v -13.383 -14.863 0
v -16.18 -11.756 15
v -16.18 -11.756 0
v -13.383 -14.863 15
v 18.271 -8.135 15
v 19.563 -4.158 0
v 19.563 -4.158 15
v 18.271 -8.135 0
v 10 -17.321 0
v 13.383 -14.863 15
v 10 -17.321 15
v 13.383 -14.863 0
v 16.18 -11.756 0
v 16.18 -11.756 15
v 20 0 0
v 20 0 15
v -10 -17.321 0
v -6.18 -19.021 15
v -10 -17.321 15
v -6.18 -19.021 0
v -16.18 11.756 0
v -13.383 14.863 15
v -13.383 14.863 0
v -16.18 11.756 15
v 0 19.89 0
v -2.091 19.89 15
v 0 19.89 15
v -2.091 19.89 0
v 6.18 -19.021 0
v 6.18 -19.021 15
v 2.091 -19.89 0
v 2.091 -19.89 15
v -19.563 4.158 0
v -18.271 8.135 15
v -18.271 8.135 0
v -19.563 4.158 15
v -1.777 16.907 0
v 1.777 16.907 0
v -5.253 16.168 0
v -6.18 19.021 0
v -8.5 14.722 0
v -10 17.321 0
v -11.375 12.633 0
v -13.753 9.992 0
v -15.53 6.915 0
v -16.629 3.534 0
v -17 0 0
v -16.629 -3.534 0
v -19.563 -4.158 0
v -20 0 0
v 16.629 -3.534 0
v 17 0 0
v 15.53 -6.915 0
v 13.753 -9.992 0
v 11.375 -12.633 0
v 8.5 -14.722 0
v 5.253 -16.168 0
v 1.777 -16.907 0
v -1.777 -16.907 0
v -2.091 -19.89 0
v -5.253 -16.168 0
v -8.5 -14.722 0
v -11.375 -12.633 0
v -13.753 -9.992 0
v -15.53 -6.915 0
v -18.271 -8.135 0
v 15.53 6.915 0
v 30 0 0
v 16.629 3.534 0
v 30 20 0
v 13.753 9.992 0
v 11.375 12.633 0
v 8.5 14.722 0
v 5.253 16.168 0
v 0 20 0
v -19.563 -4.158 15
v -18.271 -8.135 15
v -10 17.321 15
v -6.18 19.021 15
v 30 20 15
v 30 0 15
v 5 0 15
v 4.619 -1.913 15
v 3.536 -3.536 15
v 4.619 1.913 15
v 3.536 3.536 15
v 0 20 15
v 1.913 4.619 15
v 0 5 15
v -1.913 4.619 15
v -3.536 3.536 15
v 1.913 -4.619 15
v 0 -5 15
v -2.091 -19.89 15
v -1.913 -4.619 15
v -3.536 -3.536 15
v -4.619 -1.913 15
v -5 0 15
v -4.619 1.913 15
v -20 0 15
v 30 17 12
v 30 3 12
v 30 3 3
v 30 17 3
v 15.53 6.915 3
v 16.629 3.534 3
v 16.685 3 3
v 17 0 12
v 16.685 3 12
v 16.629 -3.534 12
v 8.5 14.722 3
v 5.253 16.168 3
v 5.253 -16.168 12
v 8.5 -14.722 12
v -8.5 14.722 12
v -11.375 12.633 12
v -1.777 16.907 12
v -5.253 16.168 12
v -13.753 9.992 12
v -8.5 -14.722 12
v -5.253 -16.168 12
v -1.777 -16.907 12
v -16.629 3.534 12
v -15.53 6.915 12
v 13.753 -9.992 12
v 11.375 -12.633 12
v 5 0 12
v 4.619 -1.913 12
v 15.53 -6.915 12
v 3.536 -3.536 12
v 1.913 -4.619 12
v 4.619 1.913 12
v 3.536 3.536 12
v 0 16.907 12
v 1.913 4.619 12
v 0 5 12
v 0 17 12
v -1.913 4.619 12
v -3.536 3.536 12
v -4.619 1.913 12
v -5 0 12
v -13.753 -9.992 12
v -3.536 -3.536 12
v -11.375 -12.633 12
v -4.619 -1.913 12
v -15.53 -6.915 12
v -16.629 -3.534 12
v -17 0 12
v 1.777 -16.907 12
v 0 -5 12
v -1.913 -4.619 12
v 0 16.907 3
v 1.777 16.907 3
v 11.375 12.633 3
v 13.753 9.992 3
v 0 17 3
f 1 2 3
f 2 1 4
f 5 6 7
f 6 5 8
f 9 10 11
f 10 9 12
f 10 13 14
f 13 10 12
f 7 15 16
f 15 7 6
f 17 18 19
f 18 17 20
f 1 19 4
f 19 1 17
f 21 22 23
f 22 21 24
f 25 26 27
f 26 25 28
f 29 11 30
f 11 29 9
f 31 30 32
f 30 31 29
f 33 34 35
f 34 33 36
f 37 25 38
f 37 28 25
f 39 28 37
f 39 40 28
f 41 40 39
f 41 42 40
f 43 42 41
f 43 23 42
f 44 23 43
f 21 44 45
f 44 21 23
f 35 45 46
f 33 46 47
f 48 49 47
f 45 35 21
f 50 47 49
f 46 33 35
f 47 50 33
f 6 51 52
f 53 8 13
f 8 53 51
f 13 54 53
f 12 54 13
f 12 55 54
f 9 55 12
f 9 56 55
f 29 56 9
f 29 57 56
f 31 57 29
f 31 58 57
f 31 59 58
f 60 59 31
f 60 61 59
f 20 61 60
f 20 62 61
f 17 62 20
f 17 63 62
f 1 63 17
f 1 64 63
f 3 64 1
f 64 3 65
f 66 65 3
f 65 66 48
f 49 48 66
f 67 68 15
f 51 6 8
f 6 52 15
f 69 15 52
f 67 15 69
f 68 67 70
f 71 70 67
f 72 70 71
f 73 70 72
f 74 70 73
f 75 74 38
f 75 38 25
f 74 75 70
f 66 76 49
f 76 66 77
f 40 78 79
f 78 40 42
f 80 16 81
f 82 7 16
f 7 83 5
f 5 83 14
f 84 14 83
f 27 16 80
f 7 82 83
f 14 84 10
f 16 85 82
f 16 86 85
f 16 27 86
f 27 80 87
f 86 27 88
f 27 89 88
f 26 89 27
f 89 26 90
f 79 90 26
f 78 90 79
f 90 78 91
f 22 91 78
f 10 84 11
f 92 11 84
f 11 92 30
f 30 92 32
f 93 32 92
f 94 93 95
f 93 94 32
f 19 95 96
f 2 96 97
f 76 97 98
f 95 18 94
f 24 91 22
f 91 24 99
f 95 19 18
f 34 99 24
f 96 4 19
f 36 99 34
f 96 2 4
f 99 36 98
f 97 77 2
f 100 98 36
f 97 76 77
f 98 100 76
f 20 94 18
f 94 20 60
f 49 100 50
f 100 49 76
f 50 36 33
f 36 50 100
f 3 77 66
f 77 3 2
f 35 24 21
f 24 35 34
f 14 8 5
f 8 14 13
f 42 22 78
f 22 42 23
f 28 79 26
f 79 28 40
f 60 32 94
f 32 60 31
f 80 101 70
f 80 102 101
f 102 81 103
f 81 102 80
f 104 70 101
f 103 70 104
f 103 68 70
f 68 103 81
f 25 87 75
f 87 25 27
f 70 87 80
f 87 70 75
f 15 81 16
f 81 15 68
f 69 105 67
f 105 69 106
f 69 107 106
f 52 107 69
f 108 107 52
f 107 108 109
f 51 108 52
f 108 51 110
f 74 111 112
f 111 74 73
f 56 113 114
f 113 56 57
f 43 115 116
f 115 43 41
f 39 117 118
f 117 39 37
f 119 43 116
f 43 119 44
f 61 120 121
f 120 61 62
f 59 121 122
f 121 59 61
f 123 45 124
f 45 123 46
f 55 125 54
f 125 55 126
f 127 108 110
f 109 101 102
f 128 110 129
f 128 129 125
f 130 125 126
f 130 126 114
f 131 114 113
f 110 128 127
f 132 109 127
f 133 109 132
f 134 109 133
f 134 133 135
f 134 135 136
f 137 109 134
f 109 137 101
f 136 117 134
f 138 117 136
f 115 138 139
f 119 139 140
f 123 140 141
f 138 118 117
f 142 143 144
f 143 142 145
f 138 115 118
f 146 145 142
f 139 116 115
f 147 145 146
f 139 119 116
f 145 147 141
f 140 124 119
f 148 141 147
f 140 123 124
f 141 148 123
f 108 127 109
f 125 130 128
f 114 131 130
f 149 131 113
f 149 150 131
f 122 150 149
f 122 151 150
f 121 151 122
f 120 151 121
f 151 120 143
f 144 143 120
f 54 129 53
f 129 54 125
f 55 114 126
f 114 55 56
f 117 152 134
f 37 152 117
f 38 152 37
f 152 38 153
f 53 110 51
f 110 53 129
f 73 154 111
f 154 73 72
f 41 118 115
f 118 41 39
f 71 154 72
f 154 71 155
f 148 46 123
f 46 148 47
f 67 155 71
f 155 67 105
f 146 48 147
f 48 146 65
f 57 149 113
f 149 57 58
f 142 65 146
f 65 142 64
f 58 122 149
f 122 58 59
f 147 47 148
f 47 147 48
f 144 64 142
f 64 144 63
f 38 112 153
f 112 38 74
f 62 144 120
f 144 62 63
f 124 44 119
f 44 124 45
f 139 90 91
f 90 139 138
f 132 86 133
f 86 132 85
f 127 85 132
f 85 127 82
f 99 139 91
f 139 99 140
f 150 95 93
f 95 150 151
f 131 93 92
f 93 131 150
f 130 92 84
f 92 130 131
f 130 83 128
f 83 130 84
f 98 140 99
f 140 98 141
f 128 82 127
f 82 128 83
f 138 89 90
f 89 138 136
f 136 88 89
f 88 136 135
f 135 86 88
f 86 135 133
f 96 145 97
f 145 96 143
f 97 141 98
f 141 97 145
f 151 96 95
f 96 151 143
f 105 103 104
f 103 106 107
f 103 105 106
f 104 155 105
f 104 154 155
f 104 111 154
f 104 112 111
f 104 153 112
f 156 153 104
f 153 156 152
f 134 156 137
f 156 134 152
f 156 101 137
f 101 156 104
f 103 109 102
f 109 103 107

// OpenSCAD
difference()
{
union()
{
cylinder(h = 15.000000, r = 20.000000,  center = false);
cube([30.000000, 20.000000, 15.000000], center = false);

}
cylinder(h = 12.000000, r = 17.000000,  center = false);
translate([0.000000, 0.000000, 12.000000])
cylinder(h = 10.000000, r = 5.000000,  center = false);
translate([0.000000, 3.000000, 3.000000])
cube([30.000000, 14.000000, 9.000000], center = false);

}
